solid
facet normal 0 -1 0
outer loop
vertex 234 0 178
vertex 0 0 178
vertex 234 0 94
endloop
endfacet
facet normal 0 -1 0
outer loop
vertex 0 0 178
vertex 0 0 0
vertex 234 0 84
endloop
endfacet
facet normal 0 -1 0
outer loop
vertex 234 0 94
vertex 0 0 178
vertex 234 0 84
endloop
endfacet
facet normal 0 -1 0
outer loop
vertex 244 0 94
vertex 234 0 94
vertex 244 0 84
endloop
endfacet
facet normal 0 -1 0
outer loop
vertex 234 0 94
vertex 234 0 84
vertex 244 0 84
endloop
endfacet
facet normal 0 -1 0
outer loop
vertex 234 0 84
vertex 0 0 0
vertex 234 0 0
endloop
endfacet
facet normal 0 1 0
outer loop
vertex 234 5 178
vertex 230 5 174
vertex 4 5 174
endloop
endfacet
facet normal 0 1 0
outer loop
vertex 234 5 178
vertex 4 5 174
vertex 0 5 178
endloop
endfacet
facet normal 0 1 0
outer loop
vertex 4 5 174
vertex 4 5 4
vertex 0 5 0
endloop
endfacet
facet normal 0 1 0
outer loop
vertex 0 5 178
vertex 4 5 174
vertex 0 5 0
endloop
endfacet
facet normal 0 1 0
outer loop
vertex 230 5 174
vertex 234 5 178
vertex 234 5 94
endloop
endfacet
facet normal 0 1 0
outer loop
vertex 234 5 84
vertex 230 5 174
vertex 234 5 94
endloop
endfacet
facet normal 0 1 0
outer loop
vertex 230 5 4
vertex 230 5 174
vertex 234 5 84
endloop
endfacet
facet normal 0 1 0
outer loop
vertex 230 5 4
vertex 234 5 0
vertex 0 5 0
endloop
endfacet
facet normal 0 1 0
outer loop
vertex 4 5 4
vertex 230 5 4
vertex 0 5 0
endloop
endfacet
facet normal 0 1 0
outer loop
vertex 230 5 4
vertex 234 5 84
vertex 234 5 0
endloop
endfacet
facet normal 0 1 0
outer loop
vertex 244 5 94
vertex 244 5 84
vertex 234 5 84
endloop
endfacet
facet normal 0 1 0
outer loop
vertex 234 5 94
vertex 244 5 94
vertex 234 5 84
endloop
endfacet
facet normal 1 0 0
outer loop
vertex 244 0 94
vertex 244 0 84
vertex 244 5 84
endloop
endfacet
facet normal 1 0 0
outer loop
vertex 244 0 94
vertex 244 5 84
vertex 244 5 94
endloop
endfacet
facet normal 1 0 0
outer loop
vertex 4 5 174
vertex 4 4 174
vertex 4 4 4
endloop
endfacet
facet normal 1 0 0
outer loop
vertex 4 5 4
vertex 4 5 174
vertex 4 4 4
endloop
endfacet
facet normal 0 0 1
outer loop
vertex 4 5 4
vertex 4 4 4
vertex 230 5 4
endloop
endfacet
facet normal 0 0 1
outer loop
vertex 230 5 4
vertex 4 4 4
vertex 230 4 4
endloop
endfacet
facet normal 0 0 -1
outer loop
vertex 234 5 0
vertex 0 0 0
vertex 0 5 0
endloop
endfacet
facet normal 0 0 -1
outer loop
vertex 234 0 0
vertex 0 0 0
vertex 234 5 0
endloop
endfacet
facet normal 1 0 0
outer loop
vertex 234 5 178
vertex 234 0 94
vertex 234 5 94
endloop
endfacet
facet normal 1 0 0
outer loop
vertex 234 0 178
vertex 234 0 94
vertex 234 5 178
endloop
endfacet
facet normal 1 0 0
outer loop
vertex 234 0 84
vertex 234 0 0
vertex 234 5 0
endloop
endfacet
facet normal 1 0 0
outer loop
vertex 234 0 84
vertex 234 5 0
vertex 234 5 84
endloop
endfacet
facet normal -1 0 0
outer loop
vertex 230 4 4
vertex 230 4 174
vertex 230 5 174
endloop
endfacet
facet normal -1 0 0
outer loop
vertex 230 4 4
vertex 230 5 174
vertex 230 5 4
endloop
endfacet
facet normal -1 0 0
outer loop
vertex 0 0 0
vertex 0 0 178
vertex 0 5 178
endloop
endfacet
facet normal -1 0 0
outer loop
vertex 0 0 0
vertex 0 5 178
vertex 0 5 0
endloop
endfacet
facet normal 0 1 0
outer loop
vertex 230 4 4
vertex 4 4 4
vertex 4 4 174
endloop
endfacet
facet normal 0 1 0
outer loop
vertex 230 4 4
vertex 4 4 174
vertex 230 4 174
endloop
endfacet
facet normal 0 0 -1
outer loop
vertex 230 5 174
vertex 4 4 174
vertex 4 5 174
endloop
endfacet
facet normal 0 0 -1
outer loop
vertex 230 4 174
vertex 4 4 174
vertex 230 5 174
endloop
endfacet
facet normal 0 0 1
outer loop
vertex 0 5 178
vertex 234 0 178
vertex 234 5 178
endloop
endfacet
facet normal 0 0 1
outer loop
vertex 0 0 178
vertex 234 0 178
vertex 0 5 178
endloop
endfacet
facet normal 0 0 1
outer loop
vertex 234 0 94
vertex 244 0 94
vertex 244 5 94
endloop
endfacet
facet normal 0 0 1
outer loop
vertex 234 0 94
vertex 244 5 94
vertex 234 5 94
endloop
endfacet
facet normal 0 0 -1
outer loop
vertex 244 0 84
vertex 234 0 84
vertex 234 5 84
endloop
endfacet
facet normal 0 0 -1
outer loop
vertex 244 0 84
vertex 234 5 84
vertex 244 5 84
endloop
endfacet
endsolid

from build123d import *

# Parameters (mm, degrees)
SKETCH1_W           = 226
SKETCH1_H           = 170
BOSS_EXTRUDE1_DEPTH = 5
SKETCH2_W           = 226
SKETCH2_H           = 170
BOSS_EXTRUDE2_DEPTH = 4


with BuildPart() as part:
    # Sketch1 → Boss-Extrude1 (new body)
    with BuildSketch(Plane(origin=(0, 0, 0), x_dir=(1, 0, 0), z_dir=(0, 1, 0))):
        Polygon((234, -94), (234, -178), (0, -178), (0, 0), (234, 0), (234, -84), (244, -84), (244, -94), align=None)
        with Locations((117, -89)):
            Rectangle(SKETCH1_W, SKETCH1_H, mode=Mode.SUBTRACT)
    extrude(amount=BOSS_EXTRUDE1_DEPTH)

    # Sketch2 → Boss-Extrude2 (add)
    with BuildSketch(Plane(origin=(0, 0, 0), x_dir=(1, 0, 0), z_dir=(0, 1, 0))):
        with Locations((117, -89)):
            Rectangle(SKETCH2_W, SKETCH2_H)
    extrude(amount=BOSS_EXTRUDE2_DEPTH)


solid = part.part
